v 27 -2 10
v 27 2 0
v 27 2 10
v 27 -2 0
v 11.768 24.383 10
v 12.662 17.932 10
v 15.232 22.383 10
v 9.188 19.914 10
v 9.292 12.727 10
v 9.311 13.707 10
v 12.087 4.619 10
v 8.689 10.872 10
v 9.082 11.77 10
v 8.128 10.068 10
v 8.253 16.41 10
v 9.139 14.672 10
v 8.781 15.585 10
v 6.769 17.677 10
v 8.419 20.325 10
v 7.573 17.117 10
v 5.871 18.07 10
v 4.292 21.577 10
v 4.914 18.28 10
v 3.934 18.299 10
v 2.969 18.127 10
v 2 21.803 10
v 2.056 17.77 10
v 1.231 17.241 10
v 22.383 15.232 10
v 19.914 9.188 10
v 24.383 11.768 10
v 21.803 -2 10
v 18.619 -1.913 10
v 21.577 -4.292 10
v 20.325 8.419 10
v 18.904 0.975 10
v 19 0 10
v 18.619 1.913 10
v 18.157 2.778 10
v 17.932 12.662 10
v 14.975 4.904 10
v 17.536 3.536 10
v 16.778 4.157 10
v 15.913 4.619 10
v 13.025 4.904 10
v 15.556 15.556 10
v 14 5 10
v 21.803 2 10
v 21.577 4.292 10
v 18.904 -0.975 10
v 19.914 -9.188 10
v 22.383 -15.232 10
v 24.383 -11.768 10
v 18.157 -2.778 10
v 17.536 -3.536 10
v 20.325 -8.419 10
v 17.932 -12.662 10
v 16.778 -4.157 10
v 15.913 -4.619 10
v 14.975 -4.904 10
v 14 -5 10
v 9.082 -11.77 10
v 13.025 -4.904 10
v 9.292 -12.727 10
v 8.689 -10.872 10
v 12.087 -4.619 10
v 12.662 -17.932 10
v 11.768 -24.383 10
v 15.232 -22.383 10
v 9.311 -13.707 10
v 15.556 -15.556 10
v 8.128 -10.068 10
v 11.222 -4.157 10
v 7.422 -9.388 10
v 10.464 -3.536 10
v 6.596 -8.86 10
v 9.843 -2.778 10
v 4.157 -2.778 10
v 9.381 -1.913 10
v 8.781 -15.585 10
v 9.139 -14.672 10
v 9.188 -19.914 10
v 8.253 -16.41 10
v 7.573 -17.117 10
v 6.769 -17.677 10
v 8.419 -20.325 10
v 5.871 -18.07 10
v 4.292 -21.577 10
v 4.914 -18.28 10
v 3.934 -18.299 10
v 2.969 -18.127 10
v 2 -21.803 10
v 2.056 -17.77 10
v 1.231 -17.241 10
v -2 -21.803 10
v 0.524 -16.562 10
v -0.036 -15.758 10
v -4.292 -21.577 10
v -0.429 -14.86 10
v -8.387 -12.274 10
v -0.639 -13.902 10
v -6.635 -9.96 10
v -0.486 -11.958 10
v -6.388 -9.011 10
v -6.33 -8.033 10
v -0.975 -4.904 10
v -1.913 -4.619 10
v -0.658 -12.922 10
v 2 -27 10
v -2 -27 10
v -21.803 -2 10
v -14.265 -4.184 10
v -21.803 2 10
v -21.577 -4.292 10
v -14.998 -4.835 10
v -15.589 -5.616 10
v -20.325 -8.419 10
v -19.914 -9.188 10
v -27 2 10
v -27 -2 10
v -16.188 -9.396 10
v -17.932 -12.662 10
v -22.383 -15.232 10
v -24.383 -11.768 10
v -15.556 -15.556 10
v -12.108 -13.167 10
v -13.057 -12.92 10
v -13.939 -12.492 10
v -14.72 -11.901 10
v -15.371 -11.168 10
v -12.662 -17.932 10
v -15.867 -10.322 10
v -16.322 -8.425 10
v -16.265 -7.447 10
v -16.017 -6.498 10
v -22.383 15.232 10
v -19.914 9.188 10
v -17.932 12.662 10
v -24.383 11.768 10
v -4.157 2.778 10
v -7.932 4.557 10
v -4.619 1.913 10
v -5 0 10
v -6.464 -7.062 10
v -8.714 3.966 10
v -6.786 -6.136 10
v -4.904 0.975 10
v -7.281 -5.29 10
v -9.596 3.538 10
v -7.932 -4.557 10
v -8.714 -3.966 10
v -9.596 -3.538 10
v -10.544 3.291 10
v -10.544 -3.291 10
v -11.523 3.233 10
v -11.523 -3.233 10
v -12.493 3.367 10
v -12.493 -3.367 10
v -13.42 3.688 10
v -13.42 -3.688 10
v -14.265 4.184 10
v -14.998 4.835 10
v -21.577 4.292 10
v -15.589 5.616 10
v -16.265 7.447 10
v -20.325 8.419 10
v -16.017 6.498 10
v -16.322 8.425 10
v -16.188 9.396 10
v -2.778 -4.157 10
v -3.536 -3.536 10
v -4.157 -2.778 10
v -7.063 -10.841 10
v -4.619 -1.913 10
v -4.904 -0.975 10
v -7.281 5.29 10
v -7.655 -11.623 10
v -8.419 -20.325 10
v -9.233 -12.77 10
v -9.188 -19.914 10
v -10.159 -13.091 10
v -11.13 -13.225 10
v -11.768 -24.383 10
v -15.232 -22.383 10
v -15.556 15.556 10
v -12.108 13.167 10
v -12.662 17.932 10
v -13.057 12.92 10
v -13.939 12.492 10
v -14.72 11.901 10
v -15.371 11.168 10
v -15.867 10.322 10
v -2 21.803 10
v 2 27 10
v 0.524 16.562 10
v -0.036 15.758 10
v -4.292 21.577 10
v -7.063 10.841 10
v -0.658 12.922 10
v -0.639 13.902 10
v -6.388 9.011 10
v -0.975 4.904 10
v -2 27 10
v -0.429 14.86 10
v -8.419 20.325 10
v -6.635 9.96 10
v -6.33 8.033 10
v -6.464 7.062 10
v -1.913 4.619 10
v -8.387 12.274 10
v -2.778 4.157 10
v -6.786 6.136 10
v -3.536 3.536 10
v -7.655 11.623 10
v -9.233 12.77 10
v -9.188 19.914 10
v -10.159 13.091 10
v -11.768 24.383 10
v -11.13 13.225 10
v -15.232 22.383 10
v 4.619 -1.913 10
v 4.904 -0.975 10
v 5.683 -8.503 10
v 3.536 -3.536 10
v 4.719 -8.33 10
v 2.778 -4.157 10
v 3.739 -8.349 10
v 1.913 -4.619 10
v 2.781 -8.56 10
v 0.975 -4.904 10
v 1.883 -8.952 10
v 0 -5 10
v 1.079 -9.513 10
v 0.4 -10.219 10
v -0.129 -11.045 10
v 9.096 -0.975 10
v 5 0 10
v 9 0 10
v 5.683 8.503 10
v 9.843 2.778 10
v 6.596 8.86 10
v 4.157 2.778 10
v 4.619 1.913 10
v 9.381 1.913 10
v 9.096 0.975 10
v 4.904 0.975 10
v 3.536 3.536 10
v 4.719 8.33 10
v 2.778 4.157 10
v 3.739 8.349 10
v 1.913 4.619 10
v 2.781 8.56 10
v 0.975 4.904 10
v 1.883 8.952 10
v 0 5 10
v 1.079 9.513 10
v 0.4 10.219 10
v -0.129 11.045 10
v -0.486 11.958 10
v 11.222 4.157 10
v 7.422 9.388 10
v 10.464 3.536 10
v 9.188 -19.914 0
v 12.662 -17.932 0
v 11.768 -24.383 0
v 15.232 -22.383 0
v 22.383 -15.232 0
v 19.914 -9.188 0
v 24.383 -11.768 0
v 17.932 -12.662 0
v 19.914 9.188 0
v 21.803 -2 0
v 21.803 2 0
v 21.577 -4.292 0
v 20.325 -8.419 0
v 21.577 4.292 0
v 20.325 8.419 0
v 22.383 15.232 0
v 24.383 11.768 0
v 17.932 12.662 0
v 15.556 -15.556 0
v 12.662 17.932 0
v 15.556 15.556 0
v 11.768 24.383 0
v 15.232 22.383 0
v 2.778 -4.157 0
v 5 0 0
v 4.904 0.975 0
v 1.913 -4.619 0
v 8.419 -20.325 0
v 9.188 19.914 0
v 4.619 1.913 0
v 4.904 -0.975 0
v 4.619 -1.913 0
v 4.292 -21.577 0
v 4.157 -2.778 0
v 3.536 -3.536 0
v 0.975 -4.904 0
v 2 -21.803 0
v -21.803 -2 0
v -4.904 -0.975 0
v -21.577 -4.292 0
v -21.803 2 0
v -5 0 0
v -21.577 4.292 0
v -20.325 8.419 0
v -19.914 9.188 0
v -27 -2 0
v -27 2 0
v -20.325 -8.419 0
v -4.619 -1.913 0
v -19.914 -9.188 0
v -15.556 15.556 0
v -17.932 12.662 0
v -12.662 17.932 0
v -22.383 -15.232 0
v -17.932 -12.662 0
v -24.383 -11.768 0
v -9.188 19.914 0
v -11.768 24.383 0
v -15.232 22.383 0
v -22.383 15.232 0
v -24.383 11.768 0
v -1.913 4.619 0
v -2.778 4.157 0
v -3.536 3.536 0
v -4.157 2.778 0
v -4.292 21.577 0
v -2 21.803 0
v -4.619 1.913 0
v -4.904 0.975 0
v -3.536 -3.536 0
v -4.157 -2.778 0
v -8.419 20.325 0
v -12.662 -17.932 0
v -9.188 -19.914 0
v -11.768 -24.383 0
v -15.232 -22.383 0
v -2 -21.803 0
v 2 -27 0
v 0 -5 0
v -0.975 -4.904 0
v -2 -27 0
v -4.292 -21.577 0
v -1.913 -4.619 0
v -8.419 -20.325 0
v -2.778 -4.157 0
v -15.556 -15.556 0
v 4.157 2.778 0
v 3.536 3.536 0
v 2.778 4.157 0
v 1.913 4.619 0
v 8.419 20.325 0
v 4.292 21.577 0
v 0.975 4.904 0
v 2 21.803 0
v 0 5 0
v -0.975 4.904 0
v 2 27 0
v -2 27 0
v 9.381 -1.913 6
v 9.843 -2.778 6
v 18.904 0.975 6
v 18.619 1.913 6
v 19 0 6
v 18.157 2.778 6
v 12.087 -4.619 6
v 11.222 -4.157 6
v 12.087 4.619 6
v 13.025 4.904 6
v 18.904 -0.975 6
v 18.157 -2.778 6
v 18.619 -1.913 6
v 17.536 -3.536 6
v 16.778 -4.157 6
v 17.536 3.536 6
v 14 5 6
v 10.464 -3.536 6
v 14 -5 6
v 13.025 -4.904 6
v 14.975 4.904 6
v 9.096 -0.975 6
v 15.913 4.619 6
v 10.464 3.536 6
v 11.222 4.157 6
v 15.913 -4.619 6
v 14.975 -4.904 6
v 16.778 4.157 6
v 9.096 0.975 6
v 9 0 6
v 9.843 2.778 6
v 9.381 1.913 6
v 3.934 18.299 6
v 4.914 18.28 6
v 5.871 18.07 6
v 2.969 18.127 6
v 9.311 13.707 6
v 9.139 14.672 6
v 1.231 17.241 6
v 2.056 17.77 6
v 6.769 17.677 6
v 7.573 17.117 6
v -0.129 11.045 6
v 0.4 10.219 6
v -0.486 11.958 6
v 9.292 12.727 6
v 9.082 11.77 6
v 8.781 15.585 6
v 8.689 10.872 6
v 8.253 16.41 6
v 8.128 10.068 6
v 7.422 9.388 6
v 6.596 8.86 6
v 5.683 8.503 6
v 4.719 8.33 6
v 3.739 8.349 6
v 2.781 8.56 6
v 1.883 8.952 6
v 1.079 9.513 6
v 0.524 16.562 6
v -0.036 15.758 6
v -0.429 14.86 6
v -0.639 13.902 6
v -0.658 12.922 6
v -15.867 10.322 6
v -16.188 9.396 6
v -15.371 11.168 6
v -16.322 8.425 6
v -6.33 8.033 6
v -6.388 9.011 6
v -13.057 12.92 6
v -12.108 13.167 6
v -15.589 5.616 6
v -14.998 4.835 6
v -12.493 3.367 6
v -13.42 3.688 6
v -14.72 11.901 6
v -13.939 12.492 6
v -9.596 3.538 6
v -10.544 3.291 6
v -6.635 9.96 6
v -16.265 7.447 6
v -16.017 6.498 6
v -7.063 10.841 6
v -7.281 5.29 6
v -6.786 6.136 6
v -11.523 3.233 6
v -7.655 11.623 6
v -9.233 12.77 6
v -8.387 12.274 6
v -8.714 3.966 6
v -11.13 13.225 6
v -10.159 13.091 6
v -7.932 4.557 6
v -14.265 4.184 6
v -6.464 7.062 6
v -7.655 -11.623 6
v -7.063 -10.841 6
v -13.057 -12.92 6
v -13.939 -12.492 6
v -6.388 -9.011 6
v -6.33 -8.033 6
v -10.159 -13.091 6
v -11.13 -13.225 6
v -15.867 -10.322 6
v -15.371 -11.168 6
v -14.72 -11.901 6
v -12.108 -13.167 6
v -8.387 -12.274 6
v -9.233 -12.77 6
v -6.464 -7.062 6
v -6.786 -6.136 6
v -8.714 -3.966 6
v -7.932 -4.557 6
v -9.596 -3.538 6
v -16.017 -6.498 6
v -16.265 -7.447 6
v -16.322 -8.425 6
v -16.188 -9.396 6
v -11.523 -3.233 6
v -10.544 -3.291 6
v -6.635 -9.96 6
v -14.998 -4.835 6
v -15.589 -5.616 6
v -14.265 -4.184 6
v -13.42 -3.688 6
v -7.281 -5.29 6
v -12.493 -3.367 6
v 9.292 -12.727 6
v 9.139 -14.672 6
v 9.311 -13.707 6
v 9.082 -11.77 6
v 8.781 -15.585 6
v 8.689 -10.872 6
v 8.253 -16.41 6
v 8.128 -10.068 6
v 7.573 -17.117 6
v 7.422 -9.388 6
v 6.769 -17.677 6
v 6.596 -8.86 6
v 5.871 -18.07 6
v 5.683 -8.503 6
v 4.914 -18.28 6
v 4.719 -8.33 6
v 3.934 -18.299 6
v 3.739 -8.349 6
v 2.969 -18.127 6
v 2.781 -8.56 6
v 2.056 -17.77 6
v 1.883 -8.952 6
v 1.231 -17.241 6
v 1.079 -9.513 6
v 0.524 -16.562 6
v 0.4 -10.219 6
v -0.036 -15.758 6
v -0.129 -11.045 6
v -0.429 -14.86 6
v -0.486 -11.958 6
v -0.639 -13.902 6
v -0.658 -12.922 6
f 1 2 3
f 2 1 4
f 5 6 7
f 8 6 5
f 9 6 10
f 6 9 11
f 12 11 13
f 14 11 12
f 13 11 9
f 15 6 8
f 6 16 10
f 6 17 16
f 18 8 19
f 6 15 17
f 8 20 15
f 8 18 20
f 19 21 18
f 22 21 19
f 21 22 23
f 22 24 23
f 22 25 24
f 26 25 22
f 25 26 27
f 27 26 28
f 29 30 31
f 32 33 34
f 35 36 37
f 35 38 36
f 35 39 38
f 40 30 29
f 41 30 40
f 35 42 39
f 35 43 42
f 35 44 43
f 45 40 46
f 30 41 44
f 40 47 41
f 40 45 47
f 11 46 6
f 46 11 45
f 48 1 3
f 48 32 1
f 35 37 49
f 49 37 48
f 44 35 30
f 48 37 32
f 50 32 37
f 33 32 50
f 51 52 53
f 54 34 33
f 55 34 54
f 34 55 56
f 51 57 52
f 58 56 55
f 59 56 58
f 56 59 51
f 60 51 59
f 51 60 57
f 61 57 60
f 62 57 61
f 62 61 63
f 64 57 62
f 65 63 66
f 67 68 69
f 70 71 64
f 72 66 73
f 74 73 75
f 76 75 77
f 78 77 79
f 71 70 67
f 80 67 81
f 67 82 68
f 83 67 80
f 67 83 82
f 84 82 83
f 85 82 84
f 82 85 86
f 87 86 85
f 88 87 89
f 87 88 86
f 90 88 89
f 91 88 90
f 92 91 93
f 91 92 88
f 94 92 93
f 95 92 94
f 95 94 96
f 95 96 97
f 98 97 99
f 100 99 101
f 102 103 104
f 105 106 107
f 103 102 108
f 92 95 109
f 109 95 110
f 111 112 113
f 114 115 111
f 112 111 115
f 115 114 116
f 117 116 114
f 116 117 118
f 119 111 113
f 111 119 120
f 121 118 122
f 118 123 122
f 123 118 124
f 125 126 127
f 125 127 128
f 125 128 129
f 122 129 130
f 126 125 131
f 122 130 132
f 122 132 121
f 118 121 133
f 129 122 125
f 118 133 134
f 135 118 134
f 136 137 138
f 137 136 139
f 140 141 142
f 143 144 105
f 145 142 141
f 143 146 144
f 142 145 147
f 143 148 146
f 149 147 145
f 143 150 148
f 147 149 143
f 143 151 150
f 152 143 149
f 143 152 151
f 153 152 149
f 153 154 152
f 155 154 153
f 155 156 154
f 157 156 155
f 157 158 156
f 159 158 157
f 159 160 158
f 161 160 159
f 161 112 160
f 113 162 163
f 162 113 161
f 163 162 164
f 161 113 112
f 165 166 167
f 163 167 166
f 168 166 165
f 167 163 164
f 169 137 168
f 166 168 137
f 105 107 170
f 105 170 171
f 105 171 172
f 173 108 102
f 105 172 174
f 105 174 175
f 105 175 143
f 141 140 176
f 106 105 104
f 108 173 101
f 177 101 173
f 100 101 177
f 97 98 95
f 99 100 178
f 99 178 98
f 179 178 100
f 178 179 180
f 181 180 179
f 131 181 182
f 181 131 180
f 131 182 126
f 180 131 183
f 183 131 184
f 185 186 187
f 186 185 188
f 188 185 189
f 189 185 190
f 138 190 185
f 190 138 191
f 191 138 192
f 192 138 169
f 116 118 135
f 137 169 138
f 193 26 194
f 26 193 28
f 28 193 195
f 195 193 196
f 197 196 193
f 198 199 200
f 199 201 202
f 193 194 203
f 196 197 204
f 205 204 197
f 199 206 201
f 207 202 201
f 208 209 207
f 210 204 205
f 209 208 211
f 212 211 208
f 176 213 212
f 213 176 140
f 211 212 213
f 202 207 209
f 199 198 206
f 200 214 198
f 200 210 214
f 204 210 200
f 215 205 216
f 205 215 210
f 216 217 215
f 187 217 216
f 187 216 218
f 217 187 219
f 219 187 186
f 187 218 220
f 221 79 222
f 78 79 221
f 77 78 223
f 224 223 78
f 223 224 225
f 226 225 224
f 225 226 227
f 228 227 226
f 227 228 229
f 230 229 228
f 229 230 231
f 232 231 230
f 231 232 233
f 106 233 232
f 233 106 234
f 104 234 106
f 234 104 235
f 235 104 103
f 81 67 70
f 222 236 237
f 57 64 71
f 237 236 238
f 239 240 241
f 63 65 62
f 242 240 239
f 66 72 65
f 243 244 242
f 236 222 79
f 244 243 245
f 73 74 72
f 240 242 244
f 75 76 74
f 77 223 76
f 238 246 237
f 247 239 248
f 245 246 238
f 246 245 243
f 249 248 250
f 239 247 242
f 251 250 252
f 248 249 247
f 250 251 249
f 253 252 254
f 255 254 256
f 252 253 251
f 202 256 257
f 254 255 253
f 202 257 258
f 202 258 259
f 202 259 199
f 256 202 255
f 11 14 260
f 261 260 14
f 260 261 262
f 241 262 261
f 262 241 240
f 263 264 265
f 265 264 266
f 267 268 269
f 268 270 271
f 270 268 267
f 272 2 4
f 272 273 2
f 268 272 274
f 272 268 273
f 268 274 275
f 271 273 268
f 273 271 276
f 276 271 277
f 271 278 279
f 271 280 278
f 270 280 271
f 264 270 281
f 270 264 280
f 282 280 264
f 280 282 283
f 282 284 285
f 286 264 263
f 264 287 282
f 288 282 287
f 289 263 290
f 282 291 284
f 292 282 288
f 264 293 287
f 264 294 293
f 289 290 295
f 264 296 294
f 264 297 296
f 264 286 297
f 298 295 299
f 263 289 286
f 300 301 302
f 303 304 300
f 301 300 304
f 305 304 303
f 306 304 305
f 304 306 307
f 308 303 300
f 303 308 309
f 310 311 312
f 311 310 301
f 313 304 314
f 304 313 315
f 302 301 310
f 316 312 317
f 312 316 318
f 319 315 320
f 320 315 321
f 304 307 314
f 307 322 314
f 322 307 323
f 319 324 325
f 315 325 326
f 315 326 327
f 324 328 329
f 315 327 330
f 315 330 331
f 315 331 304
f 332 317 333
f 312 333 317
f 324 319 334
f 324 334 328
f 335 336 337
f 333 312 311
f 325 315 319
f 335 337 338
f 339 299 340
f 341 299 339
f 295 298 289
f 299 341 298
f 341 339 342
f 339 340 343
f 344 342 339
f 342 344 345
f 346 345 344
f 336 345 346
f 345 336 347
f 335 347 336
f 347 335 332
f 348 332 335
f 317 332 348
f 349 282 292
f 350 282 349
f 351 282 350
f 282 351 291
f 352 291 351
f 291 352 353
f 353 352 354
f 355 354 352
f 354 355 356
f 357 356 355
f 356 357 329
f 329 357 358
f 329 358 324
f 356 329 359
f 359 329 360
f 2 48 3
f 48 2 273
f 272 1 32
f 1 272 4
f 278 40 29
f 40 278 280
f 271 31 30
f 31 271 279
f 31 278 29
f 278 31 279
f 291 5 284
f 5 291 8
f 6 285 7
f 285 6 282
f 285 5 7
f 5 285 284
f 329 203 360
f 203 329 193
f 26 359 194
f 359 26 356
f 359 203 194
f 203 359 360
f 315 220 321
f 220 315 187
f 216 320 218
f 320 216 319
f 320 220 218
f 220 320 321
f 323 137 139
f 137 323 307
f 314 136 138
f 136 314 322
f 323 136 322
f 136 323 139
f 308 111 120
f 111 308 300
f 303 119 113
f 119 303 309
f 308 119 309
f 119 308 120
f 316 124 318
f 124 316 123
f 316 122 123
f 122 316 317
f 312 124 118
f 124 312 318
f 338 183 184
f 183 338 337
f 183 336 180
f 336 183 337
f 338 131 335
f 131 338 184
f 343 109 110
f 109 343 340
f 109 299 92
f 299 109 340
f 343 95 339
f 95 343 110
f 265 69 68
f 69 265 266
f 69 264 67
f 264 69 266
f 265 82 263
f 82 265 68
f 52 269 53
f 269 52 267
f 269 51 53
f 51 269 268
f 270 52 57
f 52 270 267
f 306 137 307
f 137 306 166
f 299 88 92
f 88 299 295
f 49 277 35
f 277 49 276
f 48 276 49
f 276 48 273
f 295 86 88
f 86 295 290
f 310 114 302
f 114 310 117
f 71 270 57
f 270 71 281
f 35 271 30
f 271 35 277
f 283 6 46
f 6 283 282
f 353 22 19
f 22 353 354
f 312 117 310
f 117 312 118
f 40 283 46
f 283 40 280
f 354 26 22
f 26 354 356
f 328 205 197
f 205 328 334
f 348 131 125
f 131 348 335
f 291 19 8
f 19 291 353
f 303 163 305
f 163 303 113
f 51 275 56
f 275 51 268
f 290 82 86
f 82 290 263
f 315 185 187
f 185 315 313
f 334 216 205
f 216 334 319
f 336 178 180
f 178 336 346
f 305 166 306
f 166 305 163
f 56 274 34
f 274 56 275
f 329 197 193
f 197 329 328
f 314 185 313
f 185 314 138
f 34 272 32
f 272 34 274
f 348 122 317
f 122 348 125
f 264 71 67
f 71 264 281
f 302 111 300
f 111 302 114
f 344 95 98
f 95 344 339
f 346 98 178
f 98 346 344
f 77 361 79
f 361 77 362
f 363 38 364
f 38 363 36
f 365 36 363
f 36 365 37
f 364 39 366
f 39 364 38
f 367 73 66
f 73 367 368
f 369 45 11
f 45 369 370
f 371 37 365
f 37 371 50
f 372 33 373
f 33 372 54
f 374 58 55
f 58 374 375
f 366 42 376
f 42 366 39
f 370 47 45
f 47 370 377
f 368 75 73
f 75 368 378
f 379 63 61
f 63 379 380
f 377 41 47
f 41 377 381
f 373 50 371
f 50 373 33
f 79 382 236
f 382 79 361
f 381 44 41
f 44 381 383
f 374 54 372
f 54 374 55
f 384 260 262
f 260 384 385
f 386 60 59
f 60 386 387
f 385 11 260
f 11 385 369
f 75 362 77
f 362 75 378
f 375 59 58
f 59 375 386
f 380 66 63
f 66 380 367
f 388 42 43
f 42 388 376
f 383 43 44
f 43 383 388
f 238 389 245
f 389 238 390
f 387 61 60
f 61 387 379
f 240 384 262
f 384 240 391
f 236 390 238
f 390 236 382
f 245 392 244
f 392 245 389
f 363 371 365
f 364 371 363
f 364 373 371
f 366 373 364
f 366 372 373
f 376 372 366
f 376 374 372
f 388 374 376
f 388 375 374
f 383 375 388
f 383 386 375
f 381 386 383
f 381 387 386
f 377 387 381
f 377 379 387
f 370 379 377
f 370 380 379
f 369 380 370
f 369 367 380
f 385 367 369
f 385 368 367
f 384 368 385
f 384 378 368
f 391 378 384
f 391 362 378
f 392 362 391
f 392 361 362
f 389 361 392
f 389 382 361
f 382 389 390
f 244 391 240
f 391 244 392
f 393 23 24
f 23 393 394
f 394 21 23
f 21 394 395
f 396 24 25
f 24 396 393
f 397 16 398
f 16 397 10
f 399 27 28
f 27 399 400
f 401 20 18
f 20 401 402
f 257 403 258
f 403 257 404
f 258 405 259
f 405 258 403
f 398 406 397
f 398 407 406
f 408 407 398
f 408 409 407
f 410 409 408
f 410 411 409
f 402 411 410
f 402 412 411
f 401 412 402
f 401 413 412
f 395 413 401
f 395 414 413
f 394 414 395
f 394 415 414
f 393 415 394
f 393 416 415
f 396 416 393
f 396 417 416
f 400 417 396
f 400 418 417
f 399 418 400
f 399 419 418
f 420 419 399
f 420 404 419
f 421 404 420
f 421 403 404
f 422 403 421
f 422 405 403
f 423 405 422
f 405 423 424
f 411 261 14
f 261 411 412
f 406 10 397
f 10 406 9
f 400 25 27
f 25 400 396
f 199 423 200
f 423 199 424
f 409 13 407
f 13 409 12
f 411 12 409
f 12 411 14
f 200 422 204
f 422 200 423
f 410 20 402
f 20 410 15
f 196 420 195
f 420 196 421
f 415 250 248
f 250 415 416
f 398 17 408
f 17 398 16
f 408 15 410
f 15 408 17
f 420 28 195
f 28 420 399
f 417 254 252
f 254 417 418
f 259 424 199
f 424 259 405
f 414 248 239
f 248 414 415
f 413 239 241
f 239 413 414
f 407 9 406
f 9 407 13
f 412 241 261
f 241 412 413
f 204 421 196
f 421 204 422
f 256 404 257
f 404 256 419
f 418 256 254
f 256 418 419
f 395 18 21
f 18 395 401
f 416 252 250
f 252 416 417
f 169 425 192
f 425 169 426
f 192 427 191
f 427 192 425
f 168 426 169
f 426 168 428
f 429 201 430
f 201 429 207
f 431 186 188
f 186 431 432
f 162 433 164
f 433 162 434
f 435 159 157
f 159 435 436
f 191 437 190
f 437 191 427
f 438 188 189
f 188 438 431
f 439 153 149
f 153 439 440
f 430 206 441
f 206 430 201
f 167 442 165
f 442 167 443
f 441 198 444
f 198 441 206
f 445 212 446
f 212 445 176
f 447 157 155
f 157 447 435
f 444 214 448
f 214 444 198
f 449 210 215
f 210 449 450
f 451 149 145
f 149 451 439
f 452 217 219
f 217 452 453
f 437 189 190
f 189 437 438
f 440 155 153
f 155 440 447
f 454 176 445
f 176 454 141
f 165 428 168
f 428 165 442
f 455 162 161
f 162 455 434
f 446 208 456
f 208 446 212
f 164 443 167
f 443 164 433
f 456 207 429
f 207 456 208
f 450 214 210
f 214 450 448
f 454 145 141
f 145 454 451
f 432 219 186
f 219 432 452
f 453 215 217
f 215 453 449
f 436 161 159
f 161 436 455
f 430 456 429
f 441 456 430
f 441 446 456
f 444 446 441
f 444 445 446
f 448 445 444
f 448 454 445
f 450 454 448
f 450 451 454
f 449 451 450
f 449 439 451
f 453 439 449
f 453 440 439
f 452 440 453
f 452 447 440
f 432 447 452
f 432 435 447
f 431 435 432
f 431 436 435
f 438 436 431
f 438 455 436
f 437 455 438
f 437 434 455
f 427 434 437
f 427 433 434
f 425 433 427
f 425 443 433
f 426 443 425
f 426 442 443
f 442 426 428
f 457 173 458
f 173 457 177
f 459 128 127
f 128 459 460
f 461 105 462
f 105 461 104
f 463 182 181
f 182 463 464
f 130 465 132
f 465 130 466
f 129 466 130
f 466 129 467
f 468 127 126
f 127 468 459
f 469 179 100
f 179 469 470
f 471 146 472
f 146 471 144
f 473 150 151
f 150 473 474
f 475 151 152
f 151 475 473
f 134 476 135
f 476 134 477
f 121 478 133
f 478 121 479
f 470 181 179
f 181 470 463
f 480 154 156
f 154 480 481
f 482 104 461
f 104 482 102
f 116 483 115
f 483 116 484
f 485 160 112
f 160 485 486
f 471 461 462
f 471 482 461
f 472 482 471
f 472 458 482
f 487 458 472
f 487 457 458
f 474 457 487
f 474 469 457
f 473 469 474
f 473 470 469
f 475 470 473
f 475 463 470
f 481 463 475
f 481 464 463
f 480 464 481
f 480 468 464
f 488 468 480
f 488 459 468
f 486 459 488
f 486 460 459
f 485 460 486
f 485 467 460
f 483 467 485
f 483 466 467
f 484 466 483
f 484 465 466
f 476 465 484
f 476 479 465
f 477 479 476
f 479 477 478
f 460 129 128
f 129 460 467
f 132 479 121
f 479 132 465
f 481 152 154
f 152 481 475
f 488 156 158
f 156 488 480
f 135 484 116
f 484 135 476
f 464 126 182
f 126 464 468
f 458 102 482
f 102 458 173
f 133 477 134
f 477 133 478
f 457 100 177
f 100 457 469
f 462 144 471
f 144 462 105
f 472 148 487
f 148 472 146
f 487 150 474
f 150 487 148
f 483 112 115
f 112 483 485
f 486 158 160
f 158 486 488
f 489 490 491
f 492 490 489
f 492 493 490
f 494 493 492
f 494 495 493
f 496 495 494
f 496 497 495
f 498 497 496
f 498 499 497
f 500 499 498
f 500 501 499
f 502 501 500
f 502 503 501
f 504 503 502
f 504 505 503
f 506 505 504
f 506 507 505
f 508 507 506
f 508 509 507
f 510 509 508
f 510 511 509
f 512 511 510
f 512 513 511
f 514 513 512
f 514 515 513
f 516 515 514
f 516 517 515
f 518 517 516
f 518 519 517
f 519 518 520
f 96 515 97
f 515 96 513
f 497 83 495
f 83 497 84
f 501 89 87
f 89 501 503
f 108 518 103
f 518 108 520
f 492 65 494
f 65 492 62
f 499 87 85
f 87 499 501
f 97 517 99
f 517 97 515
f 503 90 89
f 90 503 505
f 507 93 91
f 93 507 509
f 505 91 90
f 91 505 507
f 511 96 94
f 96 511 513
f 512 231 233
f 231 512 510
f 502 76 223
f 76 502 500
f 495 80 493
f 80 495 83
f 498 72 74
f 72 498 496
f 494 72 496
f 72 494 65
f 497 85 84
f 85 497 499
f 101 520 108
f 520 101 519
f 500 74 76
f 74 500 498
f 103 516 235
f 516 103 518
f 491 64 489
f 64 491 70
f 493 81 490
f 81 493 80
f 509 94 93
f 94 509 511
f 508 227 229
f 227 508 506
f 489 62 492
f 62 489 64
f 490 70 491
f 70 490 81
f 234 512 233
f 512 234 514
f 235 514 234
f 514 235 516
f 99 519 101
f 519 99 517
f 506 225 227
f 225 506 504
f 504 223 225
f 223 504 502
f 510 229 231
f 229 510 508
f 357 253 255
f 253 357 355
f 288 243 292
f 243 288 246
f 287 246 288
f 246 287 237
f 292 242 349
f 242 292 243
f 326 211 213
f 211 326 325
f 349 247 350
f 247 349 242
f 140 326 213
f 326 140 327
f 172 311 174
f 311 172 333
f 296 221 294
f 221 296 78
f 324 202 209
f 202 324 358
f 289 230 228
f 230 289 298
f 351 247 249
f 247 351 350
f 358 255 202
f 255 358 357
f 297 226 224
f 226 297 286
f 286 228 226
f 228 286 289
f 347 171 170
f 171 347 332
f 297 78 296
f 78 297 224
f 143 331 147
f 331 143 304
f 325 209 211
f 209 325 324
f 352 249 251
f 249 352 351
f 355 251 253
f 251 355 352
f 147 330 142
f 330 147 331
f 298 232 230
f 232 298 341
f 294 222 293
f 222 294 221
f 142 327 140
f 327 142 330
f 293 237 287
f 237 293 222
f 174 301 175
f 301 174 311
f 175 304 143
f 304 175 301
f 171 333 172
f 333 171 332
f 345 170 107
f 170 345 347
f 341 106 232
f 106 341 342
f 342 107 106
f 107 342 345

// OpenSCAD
$fn = 32;

// ----------------------------------------------------------------------
// Spur blank: lightened gear blank
// ----------------------------------------------------------------------

// --- parameters (mm) ---
disc_r = 22;              // blank root radius
disc_t = 10;              // blank thickness
n_teeth = 12;             // stub tooth count
tooth_w = 4;              // tooth width at the root
tooth_h = 5;              // tooth height above the root
bore_r = 5;               // central bore radius
ring_r = 14;              // lightening pocket ring radius
pocket_r = 5;             // lightening pocket radius

out_r = disc_r + tooth_h;  // tip radius
bbox_x = 54.0;  // measured width over the teeth
bbox_y = 54.0;  // measured depth over the teeth

difference() {
union() {
  cylinder(r = disc_r, h = disc_t);
  for (i = [0 : n_teeth - 1])
    rotate([0, 0, i * 360 / n_teeth])
      translate([disc_r - 1, -tooth_w / 2, 0])
        cube([tooth_h + 1, tooth_w, disc_t]);
}
  translate([0, 0, -1]) cylinder(r = bore_r, h = disc_t + 2);
  for (i = [0 : 5])
    rotate([0, 0, i * 72])
      translate([ring_r, 0, disc_t - 4])
        cylinder(r = pocket_r, h = 5);
}
